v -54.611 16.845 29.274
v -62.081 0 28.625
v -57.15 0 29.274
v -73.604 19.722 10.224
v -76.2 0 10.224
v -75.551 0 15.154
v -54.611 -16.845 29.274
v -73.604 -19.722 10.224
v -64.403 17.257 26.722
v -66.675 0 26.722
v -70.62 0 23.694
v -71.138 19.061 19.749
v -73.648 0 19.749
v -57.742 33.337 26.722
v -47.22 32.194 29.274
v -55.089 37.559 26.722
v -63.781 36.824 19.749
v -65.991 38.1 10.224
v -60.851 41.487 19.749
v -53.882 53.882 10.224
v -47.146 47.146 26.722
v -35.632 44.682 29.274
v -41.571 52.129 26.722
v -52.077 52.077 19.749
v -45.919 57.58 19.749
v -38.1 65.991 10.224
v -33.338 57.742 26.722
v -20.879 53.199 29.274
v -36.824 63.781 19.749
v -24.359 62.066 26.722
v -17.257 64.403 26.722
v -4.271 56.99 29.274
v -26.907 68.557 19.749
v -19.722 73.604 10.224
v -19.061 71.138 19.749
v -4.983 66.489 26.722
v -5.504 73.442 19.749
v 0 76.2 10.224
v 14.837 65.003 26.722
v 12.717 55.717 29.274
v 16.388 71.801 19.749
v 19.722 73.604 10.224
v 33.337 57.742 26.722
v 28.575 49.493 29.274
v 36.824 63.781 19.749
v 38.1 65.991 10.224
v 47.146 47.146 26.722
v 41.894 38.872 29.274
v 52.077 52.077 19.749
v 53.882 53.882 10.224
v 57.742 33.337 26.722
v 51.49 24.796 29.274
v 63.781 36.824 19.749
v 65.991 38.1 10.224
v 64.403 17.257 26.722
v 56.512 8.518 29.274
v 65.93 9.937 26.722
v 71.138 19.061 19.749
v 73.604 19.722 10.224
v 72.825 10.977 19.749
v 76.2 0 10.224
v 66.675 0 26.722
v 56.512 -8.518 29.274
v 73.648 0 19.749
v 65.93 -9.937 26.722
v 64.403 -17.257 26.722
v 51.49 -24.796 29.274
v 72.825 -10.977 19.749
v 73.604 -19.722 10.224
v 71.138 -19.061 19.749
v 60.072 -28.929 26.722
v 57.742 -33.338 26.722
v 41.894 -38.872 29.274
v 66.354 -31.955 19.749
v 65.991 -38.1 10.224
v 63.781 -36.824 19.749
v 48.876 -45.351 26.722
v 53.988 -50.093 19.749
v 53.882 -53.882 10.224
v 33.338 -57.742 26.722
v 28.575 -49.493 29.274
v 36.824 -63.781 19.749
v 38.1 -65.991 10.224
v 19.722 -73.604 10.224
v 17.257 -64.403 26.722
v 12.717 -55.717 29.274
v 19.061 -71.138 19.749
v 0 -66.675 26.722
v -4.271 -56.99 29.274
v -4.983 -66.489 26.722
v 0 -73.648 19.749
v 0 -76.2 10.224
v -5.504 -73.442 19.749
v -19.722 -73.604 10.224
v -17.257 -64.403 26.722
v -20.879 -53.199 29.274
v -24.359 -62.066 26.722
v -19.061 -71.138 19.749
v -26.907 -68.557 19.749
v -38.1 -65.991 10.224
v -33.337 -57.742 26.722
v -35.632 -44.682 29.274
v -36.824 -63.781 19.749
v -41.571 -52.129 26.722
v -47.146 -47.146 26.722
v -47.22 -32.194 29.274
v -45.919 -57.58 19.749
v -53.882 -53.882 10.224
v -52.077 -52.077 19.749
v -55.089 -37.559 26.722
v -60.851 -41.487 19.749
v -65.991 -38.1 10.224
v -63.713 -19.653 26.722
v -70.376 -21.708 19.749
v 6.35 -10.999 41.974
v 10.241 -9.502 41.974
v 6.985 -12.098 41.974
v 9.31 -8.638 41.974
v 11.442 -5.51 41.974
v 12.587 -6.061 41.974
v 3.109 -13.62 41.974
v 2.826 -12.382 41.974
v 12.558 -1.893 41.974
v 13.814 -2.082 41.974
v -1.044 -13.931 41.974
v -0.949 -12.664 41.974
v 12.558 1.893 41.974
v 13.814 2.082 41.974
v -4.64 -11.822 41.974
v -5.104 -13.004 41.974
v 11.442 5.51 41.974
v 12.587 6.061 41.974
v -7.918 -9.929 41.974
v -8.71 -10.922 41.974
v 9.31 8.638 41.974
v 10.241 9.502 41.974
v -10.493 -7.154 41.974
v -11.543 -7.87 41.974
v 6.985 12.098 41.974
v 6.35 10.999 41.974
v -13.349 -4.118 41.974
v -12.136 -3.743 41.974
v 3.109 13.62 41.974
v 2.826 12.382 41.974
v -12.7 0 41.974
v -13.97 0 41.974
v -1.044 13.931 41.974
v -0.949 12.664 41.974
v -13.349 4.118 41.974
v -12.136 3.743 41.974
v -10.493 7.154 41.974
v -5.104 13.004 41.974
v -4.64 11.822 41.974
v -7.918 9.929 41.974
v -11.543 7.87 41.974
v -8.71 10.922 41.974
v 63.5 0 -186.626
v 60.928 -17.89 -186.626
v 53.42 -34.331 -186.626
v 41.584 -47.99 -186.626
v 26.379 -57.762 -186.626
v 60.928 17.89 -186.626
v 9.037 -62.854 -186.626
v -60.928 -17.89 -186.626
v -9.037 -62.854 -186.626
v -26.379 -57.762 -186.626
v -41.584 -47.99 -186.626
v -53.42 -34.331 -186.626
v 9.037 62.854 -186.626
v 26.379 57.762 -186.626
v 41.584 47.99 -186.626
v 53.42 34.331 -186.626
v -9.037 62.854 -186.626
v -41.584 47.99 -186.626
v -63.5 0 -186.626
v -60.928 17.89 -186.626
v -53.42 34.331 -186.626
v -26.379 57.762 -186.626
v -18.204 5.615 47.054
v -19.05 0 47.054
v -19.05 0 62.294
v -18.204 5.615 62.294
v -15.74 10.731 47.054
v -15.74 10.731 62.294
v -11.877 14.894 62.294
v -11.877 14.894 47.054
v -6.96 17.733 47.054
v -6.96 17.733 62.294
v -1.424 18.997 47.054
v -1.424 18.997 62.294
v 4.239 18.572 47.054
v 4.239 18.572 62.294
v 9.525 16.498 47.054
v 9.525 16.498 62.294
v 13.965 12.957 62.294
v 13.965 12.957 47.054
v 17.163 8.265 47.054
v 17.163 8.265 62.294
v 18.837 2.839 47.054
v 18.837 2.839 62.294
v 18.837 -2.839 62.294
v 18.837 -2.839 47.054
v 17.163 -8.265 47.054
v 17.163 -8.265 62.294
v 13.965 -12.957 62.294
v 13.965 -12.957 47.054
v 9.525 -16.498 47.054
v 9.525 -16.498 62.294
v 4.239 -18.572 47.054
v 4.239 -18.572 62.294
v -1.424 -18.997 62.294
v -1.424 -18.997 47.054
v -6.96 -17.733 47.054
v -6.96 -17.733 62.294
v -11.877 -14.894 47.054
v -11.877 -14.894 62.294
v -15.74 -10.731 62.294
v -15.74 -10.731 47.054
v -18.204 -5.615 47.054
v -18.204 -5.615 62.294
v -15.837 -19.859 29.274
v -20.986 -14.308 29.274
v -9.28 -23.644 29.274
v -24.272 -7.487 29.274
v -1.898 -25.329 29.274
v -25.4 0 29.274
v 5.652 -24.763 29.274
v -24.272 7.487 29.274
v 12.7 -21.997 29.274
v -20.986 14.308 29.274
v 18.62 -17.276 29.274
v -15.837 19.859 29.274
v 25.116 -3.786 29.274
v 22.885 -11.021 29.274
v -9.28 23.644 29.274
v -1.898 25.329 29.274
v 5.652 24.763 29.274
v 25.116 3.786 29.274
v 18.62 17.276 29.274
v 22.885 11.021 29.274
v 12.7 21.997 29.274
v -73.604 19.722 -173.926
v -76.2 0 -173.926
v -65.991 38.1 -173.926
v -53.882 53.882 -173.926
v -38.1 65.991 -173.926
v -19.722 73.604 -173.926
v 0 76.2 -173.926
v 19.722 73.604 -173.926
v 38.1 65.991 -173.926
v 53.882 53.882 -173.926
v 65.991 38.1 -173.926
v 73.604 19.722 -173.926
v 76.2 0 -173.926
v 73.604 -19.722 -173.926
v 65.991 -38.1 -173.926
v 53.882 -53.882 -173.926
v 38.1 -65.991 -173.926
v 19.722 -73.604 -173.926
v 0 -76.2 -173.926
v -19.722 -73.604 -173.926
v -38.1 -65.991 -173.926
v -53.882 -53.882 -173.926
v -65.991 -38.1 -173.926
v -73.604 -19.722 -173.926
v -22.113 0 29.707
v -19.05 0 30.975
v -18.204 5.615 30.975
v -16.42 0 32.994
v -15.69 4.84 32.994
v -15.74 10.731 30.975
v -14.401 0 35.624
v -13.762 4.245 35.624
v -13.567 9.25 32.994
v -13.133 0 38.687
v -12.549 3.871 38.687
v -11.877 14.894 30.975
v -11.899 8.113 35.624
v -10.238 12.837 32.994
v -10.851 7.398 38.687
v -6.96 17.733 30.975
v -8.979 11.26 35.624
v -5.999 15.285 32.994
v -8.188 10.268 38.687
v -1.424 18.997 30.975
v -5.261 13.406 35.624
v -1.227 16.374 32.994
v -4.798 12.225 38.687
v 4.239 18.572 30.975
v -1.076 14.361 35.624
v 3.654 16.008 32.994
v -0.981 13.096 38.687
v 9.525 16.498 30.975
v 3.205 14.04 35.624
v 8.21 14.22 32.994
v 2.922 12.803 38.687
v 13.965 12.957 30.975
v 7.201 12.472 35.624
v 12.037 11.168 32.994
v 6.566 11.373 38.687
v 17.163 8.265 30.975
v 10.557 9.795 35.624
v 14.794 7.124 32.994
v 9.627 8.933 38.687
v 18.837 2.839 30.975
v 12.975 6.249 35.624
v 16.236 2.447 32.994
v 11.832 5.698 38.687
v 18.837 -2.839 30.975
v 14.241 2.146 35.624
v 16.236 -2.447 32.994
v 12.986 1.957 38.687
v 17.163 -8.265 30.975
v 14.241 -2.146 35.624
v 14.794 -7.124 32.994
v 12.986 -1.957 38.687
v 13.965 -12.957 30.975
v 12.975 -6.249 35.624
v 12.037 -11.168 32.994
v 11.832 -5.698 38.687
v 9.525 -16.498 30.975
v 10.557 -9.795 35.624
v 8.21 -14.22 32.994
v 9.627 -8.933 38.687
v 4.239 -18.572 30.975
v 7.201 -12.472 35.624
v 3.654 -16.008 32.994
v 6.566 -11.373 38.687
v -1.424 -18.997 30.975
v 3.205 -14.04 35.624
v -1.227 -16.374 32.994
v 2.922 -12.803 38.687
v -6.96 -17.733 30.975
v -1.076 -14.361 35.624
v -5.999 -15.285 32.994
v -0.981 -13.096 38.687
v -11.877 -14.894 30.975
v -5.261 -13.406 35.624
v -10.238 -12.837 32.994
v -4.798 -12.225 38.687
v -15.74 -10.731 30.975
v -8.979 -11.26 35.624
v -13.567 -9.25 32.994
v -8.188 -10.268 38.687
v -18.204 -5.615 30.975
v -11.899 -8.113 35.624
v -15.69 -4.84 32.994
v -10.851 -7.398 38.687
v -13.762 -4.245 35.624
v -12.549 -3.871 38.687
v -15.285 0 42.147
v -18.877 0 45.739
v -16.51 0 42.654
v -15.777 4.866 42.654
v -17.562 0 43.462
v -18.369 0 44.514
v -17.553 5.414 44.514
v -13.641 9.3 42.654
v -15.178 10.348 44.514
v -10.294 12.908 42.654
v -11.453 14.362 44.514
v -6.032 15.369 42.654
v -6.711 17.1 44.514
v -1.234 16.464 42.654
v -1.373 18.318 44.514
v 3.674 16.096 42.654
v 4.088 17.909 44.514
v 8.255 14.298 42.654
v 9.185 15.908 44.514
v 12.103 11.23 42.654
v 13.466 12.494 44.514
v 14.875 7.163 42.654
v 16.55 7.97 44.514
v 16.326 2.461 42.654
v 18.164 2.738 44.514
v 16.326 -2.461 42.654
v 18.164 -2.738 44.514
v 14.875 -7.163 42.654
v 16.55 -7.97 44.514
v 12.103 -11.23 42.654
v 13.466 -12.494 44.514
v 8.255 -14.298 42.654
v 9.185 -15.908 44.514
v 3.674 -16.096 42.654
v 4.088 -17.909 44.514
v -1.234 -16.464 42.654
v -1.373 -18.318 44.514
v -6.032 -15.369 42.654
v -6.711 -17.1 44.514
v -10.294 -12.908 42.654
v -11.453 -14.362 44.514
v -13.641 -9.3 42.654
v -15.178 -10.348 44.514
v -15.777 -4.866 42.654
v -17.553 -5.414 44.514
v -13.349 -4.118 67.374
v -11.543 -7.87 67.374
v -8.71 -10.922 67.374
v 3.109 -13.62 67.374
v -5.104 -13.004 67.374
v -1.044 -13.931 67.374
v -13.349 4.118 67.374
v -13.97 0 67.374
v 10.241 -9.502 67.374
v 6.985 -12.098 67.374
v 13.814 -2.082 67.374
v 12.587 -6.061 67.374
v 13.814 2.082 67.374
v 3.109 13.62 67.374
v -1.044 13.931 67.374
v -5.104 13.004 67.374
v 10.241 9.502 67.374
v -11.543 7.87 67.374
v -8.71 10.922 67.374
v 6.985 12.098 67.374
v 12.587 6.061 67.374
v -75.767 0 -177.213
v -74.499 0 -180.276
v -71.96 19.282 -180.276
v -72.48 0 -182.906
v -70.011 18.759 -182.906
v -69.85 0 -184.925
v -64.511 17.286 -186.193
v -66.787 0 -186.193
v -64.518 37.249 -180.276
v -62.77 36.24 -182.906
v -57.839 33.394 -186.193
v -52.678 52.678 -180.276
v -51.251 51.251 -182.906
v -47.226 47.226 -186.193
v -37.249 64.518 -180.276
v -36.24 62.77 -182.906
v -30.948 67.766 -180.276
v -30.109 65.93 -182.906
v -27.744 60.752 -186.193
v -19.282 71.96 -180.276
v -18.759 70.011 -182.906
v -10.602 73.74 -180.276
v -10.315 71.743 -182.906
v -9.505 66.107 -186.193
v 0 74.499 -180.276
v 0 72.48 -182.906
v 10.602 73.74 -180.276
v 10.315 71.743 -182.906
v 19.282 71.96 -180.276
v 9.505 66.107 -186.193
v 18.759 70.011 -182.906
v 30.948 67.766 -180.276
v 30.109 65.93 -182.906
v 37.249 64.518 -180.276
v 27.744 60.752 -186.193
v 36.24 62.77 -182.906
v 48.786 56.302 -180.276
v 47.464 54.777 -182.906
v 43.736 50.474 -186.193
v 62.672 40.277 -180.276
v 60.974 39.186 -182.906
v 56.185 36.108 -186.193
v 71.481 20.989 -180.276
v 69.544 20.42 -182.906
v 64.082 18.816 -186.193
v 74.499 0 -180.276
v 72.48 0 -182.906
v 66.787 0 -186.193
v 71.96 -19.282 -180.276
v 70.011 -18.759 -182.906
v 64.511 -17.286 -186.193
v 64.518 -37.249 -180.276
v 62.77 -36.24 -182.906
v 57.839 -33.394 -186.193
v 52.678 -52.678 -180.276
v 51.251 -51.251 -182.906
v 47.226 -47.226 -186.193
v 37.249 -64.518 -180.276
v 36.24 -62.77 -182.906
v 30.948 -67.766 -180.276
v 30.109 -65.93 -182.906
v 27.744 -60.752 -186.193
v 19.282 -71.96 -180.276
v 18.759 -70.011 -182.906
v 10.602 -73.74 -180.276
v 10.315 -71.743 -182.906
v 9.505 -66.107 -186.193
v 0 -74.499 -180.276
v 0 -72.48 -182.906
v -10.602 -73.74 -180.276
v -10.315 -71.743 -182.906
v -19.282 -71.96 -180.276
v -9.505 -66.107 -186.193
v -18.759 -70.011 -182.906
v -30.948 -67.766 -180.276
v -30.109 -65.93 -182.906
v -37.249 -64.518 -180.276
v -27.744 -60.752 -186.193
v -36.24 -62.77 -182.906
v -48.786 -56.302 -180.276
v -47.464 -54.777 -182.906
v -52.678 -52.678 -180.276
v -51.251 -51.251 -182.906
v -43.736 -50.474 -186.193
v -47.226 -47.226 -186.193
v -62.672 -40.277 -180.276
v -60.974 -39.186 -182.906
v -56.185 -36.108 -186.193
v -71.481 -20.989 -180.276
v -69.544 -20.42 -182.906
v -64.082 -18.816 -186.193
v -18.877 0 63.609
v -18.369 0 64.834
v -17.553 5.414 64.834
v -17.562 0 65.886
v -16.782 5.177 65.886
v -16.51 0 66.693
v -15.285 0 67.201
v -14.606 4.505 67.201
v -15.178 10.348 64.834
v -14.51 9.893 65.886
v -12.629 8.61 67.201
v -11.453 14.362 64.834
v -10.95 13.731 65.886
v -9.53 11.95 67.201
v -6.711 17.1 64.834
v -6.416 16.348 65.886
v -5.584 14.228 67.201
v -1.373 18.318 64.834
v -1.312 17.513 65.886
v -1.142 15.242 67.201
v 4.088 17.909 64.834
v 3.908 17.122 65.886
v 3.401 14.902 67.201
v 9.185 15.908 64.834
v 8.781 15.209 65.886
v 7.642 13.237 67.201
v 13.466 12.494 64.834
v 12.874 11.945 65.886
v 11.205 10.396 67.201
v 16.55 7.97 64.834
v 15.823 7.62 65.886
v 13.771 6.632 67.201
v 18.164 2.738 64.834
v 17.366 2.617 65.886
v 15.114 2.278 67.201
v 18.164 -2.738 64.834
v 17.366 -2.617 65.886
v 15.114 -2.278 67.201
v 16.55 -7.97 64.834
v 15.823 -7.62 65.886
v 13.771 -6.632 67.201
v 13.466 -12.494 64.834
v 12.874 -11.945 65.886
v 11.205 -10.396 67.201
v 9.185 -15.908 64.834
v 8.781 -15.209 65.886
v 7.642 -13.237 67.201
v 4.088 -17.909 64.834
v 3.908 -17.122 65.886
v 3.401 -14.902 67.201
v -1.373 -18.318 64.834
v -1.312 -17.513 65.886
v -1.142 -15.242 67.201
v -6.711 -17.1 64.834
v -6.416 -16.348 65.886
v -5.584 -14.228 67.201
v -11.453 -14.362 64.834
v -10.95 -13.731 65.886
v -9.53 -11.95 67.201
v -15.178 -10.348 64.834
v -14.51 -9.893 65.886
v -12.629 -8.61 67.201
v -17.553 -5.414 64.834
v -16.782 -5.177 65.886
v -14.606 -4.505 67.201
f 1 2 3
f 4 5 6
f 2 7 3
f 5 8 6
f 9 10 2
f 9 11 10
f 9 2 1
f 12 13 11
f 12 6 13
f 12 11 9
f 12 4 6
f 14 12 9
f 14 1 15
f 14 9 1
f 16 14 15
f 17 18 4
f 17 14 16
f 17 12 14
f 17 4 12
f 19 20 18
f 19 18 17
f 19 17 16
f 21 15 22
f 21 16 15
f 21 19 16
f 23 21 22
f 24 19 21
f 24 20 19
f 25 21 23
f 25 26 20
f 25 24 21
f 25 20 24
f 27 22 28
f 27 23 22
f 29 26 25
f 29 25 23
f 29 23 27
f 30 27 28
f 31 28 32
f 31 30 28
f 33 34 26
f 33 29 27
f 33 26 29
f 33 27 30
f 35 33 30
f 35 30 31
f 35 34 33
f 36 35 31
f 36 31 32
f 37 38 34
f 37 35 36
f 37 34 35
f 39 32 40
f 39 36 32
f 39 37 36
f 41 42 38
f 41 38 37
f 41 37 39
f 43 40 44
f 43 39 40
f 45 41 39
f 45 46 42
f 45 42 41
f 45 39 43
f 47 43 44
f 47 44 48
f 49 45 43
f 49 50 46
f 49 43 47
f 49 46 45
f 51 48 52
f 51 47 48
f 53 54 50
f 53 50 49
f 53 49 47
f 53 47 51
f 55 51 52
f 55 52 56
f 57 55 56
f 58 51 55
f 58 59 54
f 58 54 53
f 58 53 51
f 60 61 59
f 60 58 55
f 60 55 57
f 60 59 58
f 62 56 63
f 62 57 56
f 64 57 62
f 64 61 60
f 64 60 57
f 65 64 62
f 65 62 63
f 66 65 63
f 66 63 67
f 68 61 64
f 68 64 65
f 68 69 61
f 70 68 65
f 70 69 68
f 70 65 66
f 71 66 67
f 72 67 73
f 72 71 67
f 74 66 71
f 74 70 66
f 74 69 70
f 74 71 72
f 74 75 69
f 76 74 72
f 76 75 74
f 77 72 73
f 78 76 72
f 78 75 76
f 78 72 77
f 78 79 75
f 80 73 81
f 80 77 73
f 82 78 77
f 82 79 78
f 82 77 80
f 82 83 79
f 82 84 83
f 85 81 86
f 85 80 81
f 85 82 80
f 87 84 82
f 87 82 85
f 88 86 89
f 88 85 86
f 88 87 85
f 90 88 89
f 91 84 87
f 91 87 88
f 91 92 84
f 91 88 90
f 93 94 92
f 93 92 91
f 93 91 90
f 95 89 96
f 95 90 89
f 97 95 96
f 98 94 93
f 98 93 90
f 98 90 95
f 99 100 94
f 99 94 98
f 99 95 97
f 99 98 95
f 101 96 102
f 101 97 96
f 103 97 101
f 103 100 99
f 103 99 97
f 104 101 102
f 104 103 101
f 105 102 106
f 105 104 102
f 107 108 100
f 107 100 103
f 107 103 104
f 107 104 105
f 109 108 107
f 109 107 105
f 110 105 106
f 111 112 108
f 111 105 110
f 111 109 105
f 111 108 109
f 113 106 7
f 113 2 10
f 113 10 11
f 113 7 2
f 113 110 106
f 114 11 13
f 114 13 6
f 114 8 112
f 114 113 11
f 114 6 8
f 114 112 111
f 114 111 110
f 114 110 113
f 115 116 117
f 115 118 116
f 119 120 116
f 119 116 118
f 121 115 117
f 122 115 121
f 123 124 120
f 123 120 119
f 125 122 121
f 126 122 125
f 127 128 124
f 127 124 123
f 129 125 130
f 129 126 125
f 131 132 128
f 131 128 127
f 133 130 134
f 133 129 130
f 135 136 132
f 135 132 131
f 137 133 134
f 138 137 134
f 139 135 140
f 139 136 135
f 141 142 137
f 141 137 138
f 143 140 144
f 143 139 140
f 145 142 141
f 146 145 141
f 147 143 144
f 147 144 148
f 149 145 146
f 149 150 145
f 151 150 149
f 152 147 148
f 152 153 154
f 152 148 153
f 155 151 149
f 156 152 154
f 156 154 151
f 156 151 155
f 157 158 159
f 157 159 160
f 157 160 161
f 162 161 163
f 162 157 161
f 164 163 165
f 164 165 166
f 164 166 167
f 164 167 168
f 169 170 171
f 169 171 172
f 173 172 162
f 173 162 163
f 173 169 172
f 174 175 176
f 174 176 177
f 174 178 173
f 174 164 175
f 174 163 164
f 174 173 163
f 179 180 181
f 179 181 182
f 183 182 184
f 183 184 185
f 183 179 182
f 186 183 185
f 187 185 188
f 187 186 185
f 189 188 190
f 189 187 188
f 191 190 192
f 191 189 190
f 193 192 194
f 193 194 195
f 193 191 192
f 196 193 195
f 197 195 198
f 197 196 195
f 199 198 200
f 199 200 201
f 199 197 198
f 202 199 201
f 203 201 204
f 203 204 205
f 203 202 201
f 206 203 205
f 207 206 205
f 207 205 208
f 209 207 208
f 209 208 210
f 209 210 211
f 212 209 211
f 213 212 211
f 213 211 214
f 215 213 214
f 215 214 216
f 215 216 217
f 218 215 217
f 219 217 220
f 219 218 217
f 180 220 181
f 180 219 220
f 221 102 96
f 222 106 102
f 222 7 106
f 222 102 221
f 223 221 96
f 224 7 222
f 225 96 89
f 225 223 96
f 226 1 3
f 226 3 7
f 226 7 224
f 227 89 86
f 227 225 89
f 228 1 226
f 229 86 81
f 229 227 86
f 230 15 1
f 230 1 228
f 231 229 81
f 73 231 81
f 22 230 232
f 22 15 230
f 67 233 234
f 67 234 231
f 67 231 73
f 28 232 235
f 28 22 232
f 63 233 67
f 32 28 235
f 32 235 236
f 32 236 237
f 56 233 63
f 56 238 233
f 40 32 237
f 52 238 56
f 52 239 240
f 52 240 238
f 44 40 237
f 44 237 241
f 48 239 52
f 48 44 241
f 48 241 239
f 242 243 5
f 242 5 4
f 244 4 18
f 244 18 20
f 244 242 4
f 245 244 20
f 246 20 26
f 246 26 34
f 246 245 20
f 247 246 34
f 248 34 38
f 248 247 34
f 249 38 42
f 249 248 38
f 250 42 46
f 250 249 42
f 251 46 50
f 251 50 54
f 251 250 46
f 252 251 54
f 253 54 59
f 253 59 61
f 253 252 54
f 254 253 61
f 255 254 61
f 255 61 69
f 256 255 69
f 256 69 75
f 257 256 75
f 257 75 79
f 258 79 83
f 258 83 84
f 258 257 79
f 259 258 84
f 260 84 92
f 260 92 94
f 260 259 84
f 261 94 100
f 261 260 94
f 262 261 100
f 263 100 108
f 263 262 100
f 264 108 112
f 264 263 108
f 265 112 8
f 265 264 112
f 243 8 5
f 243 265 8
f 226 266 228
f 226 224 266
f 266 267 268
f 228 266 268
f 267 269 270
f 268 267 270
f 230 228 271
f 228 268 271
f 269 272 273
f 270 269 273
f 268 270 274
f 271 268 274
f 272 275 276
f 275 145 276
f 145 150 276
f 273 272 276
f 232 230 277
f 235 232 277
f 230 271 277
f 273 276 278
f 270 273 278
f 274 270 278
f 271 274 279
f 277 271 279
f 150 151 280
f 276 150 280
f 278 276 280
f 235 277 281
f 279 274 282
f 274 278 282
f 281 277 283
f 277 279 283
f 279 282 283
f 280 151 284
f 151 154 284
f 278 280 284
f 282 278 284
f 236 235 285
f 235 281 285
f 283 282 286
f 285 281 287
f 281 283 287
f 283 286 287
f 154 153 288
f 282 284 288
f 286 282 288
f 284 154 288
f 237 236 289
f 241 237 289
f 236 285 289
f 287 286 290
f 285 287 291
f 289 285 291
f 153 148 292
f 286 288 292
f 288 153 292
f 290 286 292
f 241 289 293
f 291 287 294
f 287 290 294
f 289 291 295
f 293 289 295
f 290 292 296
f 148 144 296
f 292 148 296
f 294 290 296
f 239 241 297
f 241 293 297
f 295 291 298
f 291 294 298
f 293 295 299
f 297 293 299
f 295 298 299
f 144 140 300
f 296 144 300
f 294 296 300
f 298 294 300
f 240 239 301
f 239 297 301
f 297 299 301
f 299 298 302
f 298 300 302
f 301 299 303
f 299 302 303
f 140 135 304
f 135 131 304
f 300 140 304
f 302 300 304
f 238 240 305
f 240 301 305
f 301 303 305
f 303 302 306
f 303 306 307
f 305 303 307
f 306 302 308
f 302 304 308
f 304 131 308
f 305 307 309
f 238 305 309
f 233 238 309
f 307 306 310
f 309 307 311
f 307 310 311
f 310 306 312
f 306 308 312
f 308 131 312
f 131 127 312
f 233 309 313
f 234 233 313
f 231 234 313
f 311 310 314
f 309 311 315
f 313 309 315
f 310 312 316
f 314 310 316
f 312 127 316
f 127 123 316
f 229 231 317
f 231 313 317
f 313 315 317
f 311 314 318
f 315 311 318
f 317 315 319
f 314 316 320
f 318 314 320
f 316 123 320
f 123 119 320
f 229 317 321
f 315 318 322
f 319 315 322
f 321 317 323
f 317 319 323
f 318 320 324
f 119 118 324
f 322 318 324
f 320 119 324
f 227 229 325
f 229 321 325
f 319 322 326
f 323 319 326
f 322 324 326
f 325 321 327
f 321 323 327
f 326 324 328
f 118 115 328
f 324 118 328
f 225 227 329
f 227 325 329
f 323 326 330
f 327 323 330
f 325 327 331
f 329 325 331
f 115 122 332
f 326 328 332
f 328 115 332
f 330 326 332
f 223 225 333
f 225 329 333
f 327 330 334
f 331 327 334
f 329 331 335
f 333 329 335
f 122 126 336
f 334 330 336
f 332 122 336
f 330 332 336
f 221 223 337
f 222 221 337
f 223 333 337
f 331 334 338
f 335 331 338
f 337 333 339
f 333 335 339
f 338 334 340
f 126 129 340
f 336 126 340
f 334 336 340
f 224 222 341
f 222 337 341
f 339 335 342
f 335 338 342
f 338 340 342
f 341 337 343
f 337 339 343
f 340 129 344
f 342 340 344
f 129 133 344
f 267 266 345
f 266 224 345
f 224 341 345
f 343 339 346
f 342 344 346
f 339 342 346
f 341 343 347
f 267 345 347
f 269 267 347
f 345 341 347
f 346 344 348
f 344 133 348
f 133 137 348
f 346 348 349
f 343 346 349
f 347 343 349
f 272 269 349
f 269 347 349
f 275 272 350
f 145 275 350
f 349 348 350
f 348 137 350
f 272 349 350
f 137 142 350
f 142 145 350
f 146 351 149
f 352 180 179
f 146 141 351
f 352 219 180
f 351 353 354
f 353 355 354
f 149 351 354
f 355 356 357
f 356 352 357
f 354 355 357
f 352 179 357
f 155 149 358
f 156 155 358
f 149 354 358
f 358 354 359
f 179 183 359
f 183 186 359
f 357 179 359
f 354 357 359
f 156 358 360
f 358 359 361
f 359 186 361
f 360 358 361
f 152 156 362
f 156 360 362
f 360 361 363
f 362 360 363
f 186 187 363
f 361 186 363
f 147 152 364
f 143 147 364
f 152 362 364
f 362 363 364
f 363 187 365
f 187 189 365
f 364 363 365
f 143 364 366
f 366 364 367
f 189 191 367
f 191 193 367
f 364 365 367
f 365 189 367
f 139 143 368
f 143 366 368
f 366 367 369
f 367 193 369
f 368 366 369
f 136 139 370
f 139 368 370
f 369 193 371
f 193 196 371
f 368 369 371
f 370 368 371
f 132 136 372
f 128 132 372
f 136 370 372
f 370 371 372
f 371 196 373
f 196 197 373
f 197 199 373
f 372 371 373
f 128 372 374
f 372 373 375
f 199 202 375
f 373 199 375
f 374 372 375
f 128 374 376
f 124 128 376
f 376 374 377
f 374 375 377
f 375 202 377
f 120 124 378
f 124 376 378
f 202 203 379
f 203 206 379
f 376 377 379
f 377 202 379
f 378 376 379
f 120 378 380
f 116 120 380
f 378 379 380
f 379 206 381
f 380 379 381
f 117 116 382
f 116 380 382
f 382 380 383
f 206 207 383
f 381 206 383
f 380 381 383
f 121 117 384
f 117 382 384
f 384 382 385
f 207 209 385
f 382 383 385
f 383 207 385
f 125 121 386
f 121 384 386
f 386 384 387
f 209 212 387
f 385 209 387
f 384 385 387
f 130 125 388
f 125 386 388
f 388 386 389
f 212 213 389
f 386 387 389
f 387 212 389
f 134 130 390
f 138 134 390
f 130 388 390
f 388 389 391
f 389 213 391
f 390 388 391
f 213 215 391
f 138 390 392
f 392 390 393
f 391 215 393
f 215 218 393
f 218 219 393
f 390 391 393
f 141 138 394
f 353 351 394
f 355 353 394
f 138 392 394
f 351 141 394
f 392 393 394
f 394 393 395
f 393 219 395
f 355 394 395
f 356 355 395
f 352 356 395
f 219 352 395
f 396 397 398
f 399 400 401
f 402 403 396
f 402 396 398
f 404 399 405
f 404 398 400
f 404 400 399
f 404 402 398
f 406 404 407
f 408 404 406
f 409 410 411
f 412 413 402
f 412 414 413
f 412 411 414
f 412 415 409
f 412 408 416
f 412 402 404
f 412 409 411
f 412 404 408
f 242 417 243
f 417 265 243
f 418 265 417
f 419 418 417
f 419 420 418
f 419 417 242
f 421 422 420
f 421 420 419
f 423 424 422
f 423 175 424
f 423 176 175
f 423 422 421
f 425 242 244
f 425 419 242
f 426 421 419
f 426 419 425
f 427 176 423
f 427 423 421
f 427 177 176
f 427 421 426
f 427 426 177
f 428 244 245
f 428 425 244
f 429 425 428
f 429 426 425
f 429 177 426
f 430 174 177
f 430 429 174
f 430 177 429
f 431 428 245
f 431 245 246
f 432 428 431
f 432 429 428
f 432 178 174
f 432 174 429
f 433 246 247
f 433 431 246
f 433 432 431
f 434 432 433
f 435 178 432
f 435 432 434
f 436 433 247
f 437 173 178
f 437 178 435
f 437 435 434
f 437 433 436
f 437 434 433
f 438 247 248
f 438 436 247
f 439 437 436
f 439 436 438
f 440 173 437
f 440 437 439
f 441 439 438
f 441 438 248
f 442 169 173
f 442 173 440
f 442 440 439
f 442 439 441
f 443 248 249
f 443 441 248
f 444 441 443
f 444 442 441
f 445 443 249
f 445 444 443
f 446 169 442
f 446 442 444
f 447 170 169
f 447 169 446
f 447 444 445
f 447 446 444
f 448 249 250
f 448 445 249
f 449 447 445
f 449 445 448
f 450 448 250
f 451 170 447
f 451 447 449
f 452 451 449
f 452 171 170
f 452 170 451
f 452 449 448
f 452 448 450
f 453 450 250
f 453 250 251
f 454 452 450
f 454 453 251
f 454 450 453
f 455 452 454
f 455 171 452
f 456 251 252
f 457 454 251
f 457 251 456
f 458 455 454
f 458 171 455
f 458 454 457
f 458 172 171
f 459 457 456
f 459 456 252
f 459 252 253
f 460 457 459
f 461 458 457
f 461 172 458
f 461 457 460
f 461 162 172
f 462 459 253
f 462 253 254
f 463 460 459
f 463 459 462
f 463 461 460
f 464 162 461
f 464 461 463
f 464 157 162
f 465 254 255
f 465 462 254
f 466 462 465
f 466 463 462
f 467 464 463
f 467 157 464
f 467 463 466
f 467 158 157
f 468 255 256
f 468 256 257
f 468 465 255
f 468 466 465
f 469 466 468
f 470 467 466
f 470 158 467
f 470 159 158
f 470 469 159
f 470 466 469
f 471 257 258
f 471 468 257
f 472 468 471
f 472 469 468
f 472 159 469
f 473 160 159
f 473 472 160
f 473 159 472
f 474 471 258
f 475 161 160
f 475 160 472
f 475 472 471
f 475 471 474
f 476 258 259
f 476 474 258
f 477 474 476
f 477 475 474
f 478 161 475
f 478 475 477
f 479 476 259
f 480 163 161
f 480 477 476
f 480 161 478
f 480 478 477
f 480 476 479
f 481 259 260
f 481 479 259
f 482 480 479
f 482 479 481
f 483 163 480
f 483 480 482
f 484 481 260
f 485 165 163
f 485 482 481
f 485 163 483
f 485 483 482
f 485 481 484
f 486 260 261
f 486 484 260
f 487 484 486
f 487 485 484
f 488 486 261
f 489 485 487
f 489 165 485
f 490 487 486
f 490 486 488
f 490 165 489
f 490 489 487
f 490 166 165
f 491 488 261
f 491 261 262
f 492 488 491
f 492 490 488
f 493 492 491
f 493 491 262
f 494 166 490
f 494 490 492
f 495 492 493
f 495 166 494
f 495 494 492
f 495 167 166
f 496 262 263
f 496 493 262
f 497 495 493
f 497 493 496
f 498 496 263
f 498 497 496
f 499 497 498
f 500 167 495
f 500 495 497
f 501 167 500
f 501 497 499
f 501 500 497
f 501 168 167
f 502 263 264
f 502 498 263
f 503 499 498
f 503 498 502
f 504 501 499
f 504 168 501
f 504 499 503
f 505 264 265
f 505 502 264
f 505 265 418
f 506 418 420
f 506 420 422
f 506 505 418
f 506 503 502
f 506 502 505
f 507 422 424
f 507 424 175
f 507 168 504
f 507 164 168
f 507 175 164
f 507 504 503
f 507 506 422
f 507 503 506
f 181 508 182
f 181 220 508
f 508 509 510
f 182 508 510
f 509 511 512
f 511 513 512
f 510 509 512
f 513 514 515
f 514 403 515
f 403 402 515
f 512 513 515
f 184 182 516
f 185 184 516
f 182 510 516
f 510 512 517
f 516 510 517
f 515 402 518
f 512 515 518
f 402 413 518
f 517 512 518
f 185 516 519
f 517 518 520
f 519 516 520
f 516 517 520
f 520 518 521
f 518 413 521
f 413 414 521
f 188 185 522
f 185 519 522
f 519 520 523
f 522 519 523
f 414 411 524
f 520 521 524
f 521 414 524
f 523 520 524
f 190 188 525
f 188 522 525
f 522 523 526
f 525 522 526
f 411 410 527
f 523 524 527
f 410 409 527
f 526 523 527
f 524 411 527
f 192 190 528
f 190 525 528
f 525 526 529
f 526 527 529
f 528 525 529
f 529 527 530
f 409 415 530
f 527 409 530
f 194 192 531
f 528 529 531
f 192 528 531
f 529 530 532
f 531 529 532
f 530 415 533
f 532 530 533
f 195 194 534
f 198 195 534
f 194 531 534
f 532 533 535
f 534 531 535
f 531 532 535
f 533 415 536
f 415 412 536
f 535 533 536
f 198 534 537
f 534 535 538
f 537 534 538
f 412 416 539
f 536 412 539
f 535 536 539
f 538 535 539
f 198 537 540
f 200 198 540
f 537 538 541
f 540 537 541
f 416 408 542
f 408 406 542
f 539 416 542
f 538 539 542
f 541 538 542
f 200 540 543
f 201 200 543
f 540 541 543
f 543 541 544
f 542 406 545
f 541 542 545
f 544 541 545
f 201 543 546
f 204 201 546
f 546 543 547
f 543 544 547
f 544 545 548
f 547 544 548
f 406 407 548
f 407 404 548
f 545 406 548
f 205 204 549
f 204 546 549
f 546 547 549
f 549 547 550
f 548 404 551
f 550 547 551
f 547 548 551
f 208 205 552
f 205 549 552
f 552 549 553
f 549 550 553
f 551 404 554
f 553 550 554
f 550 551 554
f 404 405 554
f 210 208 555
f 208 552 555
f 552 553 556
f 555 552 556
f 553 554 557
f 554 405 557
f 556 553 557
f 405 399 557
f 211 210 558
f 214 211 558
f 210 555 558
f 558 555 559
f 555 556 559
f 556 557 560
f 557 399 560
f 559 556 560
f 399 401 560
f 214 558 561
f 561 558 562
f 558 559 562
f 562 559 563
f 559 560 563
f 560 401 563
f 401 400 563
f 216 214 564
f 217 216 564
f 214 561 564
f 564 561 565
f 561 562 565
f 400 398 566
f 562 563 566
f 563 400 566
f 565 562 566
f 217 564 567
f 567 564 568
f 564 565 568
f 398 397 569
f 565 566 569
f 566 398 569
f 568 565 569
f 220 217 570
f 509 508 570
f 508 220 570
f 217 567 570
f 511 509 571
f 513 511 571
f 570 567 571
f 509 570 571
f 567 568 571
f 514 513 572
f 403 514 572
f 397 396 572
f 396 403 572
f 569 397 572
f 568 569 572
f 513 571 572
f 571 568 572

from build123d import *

# Parameters (mm, degrees)
F0_W = 76.2
F0_H = 12.7
F2_R = 19.05
F3_R = 12.7
F4_R = 12.69999
F5_R = 5.08
F6_R = 5.08


# Not quite as in the source:
# - a fillet or chamfer is up to 0.001 mm smaller than in the source, because OpenCascade refuses the exact size


with BuildPart() as f1:
    # F0 (on Front) → F1 (revolve)
    with BuildSketch(Plane.XZ):
        with Locations((-38.1, -180.2761299372)):
            Rectangle(F0_W, F0_H)
        Polygon((-76.2, -173.9261299372), (0, -173.9261299372), (0, 29.2738700628), (-12.7, 29.2738700628), (-76.2, 29.2738700628), align=None)
        Polygon((-12.7, 29.2738700628), (0, 29.2738700628), (0, 35.6238700628), (0, 41.9738700628), (-12.7, 41.9738700628), align=None)
        Polygon((-19.05, 41.9738700628), (-12.7, 41.9738700628), (0, 41.9738700628), (0, 61.0238700628), (0, 67.3738700628), (-19.05, 67.3738700628), align=None)
    revolve(axis=Axis((0, 0, -14.5017058273), (0, 0, -1)))

    # F2
    f2_edges = [f1.edges().sort_by_distance(p)[0] for p in [
        (76.2, 0, 29.27387),
    ]]
    fillet(f2_edges, radius=F2_R)

    # F3
    f3_edges = [f1.edges().sort_by_distance(p)[0] for p in [
        (76.2, 0, -186.62613),
    ]]
    fillet(f3_edges, radius=F3_R)

    # F4 (radius 12.7 in the source; OpenCascade refuses exactly that, so slightly less here)
    f4_edges = [f1.edges().sort_by_distance(p)[0] for p in [
        (12.7, 0, 29.27387),
    ]]
    fillet(f4_edges, radius=F4_R)

    # F5
    f5_edges = [f1.edges().sort_by_distance(p)[0] for p in [
        (19.05, 0, 41.97387),
    ]]
    fillet(f5_edges, radius=F5_R)

    # F6
    f6_edges = [f1.edges().sort_by_distance(p)[0] for p in [
        (19.05, 0, 67.37387),
    ]]
    fillet(f6_edges, radius=F6_R)


solid = f1.part
